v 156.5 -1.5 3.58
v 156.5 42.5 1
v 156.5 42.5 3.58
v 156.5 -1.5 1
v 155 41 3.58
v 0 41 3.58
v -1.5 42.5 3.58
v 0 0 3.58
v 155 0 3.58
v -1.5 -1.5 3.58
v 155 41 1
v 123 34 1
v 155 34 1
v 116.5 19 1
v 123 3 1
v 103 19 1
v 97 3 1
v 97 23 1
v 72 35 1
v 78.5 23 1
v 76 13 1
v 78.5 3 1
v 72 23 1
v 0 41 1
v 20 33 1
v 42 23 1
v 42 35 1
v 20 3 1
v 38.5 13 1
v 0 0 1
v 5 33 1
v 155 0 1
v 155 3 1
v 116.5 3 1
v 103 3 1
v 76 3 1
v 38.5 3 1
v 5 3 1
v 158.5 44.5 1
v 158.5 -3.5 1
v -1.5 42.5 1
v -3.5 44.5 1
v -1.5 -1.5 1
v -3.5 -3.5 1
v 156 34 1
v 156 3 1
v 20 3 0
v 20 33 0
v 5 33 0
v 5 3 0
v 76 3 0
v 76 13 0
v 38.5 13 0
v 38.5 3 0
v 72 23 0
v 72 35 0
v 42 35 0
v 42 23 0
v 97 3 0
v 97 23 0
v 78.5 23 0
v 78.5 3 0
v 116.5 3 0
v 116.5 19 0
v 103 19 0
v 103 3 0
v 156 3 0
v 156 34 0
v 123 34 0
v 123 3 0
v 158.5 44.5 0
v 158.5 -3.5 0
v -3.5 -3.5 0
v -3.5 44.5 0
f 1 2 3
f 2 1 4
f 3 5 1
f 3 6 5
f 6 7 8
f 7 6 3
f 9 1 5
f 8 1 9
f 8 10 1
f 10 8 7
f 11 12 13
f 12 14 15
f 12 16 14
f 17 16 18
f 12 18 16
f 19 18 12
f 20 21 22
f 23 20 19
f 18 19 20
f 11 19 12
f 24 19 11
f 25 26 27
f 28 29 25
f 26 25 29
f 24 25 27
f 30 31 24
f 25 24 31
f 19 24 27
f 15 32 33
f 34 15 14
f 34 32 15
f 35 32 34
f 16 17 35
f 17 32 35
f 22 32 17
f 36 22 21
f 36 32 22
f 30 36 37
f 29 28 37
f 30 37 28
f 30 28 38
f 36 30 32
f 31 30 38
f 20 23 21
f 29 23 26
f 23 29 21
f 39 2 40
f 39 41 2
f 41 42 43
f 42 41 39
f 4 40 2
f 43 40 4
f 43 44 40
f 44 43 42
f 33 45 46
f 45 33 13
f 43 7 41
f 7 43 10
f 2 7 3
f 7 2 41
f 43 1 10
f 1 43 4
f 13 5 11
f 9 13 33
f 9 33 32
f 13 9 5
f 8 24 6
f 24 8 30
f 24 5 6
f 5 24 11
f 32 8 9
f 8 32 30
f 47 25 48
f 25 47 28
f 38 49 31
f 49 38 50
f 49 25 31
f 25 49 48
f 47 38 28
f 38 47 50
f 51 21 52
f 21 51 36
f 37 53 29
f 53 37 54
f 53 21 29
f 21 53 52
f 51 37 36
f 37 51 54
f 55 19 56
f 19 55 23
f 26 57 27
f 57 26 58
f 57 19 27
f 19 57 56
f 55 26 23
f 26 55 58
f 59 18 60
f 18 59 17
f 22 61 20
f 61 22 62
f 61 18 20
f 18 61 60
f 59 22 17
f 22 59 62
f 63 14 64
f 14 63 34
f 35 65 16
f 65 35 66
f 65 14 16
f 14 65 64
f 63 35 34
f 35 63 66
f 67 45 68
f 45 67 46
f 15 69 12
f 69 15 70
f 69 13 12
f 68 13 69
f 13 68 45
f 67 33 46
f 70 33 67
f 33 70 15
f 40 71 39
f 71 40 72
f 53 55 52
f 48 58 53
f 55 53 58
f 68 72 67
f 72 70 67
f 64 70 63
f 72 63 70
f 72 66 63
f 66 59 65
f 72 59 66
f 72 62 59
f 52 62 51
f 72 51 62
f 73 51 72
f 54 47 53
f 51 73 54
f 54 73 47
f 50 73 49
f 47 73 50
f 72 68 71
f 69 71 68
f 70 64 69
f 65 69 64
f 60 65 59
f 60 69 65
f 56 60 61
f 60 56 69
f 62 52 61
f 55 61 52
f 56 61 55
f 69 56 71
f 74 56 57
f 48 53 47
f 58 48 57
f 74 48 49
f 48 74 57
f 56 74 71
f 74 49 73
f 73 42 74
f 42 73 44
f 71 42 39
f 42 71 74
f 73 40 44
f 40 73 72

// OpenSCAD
// I/O shield for X

// based on blank_v01
translate([-3.5, -3.5, 0]) union() {
    
    // border
    translate([2, 2, 1]){
        difference() {
            cube([158, 44, 2.58]);
            translate([1.5, 1.5, -0.01]) cube([155, 41, 2.60]);
        }
    }
    
    // backplate
    difference() {
        cube([162, 48, 1]);
        
        translate([3.5, 3.5, -1]) {
            //Place your IO recesses here.
            // PS/2 + 2 USB
            translate([5, 3, 0]) cube([15, 30, 3]);
            // DVI
            translate([5+15+18.5, 3, 0]) cube([37.5, 10, 3]);
            // VGA
            translate([5+15+22, 23, 0]) cube([30, 12, 3]);
            // HDMI + DisplayPort
            translate([5+15+58.5, 3, 0]) cube([18.5, 20, 3]);
            // USB Type-C + USB
            translate([5+15+83, 3, 0]) cube([13.5, 16, 3]);
            // 2 USB + Ethernet + 3 Audio
            translate([5+15+103, 3, 0]) cube([33, 31, 3]);
        }
    } 
}
